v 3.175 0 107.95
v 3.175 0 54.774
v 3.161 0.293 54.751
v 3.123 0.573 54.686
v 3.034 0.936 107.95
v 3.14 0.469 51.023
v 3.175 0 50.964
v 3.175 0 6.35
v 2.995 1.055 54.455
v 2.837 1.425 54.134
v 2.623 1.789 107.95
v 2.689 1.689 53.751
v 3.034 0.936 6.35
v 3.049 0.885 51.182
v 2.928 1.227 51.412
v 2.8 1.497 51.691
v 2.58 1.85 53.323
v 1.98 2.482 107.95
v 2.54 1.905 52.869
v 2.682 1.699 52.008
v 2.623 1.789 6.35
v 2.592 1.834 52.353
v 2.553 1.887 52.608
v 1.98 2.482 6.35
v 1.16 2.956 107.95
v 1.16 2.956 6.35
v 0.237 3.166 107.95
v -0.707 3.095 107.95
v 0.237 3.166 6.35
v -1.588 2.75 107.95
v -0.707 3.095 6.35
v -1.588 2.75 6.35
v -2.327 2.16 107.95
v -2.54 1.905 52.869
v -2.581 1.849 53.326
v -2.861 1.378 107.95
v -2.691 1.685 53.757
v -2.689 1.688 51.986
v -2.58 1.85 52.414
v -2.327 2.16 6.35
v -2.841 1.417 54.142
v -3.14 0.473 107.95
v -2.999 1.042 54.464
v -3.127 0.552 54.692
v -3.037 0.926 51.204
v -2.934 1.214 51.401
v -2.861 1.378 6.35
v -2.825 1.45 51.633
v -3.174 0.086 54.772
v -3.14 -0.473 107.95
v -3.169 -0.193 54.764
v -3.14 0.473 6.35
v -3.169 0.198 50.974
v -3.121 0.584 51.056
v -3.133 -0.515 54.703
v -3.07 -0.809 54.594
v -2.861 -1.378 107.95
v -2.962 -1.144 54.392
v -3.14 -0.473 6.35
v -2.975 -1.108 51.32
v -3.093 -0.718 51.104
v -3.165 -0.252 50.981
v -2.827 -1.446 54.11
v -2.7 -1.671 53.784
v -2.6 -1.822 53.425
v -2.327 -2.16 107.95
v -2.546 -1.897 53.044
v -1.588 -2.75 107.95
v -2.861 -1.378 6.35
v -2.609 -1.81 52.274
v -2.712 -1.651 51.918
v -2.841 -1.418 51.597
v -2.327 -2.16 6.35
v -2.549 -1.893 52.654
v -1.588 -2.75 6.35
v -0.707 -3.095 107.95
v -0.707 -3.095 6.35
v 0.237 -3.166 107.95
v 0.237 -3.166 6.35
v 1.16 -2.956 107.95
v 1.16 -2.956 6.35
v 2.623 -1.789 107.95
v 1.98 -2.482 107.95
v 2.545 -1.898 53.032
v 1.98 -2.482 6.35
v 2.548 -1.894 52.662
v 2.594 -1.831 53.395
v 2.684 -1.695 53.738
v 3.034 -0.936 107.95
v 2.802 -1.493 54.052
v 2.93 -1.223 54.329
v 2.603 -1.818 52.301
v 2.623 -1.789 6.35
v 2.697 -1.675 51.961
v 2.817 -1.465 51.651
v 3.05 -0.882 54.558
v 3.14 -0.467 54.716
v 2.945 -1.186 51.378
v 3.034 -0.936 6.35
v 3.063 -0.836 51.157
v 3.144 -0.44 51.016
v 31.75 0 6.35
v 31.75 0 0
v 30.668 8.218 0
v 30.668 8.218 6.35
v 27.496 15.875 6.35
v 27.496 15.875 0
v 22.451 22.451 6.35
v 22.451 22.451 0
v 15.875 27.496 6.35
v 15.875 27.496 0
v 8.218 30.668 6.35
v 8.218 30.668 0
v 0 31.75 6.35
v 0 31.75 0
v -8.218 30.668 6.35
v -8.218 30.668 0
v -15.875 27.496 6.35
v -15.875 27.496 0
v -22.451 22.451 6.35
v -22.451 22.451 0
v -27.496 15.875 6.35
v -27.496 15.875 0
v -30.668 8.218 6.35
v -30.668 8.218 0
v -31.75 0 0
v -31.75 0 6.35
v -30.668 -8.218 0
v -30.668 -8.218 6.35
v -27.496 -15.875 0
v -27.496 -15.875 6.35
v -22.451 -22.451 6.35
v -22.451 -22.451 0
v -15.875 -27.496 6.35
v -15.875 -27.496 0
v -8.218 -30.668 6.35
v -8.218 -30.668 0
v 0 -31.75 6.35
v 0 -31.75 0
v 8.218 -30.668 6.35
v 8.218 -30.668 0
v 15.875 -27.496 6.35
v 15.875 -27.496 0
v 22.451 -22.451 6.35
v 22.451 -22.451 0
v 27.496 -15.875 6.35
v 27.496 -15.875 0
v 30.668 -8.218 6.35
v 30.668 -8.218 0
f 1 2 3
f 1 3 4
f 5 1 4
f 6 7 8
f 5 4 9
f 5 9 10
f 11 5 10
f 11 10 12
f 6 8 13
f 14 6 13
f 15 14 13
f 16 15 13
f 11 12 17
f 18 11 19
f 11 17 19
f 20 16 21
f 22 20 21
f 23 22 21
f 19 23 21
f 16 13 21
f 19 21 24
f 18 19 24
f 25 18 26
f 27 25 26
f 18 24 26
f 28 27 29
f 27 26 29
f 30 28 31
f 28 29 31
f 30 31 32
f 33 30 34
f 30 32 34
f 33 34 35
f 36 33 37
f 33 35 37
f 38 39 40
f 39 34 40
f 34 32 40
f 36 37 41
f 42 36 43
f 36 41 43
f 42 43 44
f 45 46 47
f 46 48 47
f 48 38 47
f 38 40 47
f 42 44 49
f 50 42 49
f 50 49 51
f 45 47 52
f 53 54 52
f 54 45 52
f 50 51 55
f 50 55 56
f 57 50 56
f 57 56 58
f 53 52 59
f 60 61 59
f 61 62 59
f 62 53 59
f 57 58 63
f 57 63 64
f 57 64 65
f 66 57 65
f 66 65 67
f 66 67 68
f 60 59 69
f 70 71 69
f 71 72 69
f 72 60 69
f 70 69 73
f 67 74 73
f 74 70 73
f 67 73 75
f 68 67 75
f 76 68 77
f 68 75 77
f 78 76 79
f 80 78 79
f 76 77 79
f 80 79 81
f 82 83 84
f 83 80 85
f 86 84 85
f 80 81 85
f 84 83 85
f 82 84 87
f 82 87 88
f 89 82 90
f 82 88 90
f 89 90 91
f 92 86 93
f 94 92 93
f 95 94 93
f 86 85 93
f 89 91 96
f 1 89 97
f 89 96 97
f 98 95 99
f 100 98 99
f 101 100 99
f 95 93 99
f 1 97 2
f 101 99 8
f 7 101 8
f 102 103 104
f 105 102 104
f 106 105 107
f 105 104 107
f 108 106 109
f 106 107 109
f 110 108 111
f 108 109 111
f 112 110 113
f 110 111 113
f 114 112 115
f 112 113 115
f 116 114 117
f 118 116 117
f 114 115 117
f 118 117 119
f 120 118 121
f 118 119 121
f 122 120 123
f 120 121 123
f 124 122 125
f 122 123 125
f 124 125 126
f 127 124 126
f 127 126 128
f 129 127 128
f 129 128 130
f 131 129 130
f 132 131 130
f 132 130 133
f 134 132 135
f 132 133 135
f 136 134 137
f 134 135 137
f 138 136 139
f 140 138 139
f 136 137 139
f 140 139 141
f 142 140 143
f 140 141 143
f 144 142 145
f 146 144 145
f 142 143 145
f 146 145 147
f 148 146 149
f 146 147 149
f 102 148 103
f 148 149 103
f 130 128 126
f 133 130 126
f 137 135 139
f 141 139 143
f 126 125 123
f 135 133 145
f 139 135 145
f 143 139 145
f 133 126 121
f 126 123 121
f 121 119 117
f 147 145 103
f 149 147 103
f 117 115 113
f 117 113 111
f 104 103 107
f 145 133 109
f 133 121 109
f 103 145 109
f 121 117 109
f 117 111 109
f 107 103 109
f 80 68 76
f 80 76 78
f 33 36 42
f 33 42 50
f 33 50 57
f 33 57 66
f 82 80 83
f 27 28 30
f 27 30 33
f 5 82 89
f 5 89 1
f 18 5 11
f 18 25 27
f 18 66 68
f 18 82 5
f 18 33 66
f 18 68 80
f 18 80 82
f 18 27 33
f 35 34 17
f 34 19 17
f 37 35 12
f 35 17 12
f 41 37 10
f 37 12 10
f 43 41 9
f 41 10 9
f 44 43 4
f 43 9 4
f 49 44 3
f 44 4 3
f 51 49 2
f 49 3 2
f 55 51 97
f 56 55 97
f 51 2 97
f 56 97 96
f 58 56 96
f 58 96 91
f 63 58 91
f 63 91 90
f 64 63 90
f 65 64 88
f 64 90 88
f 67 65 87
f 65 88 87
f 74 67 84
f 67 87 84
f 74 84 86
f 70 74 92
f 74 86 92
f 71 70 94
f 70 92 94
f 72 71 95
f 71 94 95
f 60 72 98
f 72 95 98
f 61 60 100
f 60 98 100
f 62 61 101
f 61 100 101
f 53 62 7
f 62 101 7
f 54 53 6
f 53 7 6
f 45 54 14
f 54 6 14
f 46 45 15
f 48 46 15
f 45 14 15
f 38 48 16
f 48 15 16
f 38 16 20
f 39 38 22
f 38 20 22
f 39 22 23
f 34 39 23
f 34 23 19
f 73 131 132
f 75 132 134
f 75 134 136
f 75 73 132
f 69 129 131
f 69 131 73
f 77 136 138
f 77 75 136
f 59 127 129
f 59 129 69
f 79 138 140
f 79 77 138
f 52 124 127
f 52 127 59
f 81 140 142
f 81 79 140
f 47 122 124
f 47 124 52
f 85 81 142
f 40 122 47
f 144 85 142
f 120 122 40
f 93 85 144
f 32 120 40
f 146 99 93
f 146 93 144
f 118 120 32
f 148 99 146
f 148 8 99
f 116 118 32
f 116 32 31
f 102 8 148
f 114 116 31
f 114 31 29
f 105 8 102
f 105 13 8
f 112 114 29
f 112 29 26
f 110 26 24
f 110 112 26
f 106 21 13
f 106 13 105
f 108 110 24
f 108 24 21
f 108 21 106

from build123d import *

# Parameters (mm, degrees)
F0_R     = 31.75
F1_DEPTH = 6.35
F2_R     = 3.175
F3_DEPTH = 101.6
F4_R     = 1.905
F5_DEPTH = 12.7


with BuildPart() as f1:
    # F0 (on Top) → F1 (new body)
    with BuildSketch(Plane.XY):
        Circle(F0_R)
    extrude(amount=F1_DEPTH)

    # F2 (on face) → F3 (join)
    with BuildSketch(Plane.XY.offset(6.35)):
        Circle(F2_R)
    extrude(amount=F3_DEPTH)

    # F4 (on Right) → F5 (cut, symmetric)
    with BuildSketch(Plane.YZ):
        with Locations((0, 52.869016)):
            Circle(F4_R)
    extrude(amount=F5_DEPTH, both=True, mode=Mode.SUBTRACT)


solid = f1.part
